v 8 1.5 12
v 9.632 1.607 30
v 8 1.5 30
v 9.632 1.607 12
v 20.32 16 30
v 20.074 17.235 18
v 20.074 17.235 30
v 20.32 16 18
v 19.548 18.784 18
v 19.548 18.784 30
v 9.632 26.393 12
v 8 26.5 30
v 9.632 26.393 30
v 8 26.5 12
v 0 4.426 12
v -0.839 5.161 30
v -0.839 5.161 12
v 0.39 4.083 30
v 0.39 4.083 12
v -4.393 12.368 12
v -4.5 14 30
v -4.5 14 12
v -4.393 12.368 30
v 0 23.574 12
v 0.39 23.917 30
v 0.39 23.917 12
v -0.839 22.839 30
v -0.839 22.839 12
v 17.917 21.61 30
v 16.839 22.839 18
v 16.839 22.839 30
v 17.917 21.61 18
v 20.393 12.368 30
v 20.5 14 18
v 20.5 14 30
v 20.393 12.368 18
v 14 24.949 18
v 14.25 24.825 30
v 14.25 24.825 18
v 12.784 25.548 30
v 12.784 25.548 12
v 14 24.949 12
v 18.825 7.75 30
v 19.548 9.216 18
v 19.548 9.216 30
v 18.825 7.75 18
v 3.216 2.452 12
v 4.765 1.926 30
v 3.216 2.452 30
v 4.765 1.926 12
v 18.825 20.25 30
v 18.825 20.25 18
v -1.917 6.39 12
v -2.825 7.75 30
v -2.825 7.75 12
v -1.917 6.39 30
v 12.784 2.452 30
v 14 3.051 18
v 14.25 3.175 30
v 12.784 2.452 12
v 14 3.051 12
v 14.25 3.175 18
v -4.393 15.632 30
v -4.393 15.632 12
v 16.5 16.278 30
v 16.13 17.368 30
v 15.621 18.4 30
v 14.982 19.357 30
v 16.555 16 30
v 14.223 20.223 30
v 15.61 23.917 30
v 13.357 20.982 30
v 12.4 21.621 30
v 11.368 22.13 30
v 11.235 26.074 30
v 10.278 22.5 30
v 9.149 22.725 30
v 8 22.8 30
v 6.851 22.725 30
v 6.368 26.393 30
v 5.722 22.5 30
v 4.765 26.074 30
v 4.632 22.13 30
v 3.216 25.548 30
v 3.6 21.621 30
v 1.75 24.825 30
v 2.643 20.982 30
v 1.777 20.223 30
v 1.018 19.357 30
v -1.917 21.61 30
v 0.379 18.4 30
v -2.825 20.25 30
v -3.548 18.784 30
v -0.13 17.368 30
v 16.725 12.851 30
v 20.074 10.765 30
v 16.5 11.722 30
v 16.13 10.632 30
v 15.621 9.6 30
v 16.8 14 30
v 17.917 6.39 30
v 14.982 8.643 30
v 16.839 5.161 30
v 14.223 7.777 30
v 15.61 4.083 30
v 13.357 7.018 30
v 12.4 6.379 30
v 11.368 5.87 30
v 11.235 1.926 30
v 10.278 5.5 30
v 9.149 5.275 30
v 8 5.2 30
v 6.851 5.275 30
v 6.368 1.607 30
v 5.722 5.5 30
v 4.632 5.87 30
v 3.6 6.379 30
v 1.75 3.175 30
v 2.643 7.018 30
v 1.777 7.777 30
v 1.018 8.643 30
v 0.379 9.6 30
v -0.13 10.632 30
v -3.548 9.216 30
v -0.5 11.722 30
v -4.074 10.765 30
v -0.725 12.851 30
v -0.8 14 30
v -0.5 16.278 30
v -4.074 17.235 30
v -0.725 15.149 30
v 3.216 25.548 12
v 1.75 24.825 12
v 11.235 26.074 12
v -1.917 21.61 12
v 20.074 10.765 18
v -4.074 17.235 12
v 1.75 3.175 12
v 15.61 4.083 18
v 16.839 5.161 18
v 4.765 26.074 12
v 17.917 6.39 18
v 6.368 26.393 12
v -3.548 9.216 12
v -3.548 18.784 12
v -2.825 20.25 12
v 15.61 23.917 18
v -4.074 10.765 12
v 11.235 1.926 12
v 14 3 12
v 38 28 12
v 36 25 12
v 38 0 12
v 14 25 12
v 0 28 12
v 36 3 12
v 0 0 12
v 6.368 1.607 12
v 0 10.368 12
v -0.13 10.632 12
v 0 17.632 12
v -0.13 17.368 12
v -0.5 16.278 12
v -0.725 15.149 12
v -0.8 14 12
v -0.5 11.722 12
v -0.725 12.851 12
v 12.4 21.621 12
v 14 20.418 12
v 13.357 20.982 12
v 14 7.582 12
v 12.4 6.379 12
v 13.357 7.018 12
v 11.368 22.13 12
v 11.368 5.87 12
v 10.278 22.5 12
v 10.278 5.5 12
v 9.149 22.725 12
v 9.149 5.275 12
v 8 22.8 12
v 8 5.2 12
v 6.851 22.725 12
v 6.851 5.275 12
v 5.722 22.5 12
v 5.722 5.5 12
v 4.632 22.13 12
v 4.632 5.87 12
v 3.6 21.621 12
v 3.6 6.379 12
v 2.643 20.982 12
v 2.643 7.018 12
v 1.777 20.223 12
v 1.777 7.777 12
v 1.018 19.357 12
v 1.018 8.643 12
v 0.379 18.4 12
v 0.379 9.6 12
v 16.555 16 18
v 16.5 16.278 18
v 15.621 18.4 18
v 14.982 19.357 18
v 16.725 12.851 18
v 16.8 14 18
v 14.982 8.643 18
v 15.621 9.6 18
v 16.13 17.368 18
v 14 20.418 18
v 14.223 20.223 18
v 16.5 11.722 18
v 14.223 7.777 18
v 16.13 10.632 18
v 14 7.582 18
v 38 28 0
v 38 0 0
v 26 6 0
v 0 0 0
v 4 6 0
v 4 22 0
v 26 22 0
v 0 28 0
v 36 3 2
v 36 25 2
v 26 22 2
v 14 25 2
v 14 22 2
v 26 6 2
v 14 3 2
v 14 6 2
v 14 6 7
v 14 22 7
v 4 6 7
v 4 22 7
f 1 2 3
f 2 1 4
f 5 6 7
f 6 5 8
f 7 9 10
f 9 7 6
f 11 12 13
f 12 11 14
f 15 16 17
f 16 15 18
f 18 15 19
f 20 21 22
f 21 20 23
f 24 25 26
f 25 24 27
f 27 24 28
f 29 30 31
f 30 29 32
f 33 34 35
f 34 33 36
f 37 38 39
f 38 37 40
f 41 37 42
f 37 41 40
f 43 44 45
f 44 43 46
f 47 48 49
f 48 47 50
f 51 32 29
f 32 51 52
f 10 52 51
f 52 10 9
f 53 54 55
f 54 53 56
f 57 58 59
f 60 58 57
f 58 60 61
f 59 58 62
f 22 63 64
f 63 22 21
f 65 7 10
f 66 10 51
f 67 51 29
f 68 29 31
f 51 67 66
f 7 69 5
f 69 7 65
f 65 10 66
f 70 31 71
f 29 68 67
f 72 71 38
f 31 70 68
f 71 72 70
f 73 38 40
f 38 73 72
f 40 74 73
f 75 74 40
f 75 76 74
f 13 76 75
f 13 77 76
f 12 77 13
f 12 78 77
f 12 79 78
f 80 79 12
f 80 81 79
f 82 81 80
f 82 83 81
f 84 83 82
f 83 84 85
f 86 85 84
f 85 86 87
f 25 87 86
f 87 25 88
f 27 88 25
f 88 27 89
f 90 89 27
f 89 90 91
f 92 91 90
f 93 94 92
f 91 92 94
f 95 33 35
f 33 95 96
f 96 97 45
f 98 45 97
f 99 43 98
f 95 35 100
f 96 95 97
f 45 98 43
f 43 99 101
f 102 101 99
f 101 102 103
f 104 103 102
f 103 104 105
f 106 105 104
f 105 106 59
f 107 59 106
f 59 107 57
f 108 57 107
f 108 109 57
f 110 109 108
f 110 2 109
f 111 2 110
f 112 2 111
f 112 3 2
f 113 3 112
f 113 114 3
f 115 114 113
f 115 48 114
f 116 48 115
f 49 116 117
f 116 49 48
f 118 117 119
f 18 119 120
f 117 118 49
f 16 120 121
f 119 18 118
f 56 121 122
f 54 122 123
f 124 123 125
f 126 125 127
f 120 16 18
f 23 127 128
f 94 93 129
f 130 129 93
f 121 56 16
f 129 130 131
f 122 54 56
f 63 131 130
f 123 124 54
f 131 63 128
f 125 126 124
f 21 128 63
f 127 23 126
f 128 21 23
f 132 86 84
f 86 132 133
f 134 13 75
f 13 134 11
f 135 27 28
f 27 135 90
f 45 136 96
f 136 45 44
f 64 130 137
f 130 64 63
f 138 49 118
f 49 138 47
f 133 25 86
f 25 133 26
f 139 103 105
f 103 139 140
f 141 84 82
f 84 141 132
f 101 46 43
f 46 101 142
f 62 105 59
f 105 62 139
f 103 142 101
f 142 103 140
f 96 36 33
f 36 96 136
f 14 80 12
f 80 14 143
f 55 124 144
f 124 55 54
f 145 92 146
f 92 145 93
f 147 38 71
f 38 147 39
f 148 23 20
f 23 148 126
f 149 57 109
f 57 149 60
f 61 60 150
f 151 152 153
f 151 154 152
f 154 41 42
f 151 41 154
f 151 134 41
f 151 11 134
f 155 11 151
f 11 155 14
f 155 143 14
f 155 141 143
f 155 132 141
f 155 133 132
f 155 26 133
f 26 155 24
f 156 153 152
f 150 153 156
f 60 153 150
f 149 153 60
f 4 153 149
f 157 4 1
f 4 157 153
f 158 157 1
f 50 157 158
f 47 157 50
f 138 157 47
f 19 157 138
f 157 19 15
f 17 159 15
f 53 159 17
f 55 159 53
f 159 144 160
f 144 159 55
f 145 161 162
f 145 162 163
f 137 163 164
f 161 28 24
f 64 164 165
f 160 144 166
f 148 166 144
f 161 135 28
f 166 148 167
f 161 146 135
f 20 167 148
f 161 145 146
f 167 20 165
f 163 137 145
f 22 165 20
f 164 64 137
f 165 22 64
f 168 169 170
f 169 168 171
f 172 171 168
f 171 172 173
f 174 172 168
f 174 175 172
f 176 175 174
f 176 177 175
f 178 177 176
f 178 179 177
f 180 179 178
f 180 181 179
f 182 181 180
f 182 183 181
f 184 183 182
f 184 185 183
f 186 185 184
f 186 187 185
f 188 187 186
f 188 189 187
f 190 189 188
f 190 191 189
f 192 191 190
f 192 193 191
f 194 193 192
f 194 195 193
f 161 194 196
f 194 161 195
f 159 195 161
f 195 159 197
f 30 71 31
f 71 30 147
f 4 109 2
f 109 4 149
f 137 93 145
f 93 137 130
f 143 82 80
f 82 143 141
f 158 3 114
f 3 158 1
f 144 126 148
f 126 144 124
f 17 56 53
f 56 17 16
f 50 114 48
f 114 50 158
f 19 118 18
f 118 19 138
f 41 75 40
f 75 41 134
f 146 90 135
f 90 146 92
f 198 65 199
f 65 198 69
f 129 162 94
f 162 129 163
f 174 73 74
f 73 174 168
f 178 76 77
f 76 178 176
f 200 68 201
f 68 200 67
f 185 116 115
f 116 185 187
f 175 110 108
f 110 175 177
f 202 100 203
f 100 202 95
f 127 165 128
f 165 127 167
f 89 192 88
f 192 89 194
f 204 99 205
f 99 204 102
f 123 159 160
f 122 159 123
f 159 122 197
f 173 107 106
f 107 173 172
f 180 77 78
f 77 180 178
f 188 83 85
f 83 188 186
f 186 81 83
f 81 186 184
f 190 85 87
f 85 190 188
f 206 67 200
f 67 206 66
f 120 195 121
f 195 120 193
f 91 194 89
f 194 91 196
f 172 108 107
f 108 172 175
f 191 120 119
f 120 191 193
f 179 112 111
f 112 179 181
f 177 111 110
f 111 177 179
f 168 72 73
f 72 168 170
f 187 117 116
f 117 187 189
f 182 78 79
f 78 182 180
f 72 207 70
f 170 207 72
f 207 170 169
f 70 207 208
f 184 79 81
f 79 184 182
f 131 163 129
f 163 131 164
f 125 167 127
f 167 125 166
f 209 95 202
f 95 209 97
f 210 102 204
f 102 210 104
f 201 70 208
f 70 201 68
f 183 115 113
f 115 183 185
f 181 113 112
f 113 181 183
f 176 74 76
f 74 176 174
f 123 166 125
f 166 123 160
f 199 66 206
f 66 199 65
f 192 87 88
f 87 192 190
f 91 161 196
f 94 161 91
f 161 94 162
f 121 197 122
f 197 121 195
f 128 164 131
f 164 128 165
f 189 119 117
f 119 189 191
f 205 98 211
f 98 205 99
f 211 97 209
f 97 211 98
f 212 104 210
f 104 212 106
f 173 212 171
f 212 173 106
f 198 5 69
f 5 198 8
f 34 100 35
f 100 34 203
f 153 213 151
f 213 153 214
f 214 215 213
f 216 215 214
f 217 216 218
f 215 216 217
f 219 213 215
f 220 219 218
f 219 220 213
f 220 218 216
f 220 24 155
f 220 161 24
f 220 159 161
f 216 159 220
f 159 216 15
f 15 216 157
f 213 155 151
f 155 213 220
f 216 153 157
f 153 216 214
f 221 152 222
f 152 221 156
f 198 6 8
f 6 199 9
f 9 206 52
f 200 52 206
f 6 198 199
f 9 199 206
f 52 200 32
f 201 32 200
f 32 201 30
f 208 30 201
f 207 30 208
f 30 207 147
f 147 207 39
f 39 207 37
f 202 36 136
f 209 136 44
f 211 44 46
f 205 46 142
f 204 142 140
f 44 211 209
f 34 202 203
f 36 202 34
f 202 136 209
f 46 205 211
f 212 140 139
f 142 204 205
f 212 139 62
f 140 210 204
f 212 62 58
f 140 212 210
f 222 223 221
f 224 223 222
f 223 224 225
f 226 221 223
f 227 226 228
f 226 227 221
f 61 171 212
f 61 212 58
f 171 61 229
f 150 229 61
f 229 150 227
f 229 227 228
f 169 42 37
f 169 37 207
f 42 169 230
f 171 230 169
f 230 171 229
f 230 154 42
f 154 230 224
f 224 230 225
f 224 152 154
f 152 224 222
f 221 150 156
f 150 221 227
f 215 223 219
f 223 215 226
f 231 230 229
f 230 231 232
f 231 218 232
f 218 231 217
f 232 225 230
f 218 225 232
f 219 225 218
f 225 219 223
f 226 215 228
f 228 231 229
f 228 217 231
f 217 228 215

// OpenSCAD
// Parametric plunger carriage for a disposable syringe.
// The printed part never enters the fluid path.
// Check every dimension against the syringe and the leadscrew nut you bought.
// Units: millimeters.

syringe_body_od = 17.0;     // measure the barrel, not the catalog "10 mL"
plunger_flange_mm = 22.0;
leadscrew_nut_w = 22.0;     // T8 brass nut across flats, typical; measure yours
leadscrew_nut_h = 16.0;
wall = 4.0;
$fn = 48;

module clamp_ring(id, od, h) {
    difference() {
        cylinder(h = h, d = od);
        translate([0, 0, -1]) cylinder(h = h + 2, d = id);
        // slit so it can close on the barrel with a screw, not a glue joint
        translate([-1, 0, -1]) cube([od, 2, h + 2]);
    }
}

module carriage() {
    difference() {
        union() {
            cube([plunger_flange_mm + 16, 28, 12]);
            translate([8, 14, 12])
                clamp_ring(syringe_body_od + 0.6, syringe_body_od + 2 * wall, 18);
        }
        // pocket for the leadscrew nut
        translate([plunger_flange_mm + 16 - leadscrew_nut_w - 2, 14 - leadscrew_nut_w / 2, 2])
            cube([leadscrew_nut_w, leadscrew_nut_w, leadscrew_nut_h]);
        // plunger flange slot
        translate([4, 6, -1]) cube([plunger_flange_mm, 16, 8]);
    }
}

carriage();
